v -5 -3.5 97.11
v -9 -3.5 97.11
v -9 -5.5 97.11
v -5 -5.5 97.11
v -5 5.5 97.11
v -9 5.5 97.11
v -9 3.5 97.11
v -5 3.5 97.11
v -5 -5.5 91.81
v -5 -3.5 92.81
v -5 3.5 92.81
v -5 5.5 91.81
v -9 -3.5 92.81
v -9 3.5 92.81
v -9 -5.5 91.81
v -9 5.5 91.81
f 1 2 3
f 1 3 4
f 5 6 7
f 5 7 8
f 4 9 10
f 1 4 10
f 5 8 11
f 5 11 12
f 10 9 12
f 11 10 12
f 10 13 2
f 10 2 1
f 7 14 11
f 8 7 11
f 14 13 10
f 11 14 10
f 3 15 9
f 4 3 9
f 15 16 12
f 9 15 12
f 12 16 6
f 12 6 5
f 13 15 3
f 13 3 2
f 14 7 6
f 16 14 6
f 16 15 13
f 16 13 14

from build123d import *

# Parameters (mm, degrees)
BOX002_W     = 4
BOX002_H     = 7
BOX002_DEPTH = 1
BOX007_W     = 4
BOX007_H     = 2
BOX007_DEPTH = 5.3
BOX003_W     = 4
BOX003_H     = 2
BOX003_DEPTH = 5.3


with BuildPart() as cubo003:
    # Box002 → Box002 (new body)
    with BuildSketch(Plane(origin=(0, 1, 0), x_dir=(1, 0, 0), z_dir=(0, 0, 1))):
        with Locations((2, 3.5)):
            Rectangle(BOX002_W, BOX002_H)
    extrude(amount=BOX002_DEPTH)


with BuildPart() as cubo006:
    # Box007 → Box007 (new body)
    with BuildSketch(Plane(origin=(0, 8, 0), x_dir=(1, 0, 0), z_dir=(0, 0, 1))):
        with Locations((2, 1)):
            Rectangle(BOX007_W, BOX007_H)
    extrude(amount=BOX007_DEPTH)


with BuildPart() as bridge:
    # Box003 → Box003 (new body)
    with BuildSketch(Plane(origin=(0, -1, 0), x_dir=(1, 0, 0), z_dir=(0, 0, 1))):
        with Locations((2, 1)):
            Rectangle(BOX003_W, BOX003_H)
    extrude(amount=BOX003_DEPTH)

    # Fusion007: union Cubo003, Cubo006
    add(cubo003.part)
    add(cubo006.part)


with BuildPart() as bridge_1:
    # Fusion007 placement: moved
    add(bridge.part.moved(Location((-9, -4.5, 91.81))))


solid = bridge_1.part
